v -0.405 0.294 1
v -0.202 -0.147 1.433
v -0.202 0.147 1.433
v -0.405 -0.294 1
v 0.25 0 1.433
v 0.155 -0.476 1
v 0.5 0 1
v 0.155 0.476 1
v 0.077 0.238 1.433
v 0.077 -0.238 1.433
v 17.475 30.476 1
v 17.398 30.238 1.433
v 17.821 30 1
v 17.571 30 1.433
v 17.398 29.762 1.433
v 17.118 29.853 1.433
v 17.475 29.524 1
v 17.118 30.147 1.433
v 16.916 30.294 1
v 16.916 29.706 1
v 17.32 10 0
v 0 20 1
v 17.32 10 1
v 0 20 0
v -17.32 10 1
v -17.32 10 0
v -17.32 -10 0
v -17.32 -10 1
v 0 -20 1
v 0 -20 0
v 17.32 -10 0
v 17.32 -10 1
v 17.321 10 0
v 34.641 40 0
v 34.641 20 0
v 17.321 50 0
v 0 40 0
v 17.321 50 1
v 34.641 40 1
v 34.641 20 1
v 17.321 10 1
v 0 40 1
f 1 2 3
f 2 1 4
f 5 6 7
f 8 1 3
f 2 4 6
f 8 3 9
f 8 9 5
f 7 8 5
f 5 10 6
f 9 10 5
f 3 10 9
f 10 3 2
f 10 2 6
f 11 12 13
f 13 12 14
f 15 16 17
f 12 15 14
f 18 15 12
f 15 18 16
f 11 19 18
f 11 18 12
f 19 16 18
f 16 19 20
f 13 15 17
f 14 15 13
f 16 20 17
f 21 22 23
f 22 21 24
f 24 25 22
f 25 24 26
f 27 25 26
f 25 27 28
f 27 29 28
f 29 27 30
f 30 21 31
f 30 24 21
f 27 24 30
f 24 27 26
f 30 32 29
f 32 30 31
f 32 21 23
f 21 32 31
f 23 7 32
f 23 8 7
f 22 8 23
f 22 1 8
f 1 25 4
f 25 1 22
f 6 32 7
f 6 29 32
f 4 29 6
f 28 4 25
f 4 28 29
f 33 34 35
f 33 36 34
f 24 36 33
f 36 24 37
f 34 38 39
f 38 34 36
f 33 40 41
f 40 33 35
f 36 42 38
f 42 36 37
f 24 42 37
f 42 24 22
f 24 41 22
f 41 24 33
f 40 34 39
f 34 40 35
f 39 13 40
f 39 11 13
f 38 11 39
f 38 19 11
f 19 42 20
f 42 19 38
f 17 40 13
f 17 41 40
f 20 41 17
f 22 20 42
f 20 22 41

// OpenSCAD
// ------------------------------------------------------------
// Hexagon adjacency test
// Draws two identical regular hexagons A and B
// Both start centered at [0,0]
// B is translated by (√3/2 * s, 1.5 * s)
// ------------------------------------------------------------

// === Parameters ===
s = 20;                // side length (also radius)
thickness = 1;         // extrusion height
show_labels = true;

// === Base hexagon ===
module hex2d(side) {
    polygon([for (i = [0:5])
        [side * cos(30 + i * 60), side * sin(30 + i * 60)]
    ]);
}

module hex3d(side) {
    linear_extrude(height = thickness)
        hex2d(side);
}

// === Draw reference A (centered) ===
color("gold")
hex3d(s);

// === Draw second hex B, translated ===
dx = sqrt(3)/2 * s;
dy = 1.5 * s;

color("orange", 0.6)
translate([dx, dy, 0])
hex3d(s);

// === Optional labels and guides ===
if (show_labels) {
    color("red") {
        translate([0, 0, thickness]) sphere(0.5);                // center A
        translate([dx, dy, thickness]) sphere(0.5);              // center B
    }
    echo("Translation (dx, dy): ", [dx, dy]);
    echo("Expected contact: edge A(0–1) ↔ edge B(3–4)");
}
